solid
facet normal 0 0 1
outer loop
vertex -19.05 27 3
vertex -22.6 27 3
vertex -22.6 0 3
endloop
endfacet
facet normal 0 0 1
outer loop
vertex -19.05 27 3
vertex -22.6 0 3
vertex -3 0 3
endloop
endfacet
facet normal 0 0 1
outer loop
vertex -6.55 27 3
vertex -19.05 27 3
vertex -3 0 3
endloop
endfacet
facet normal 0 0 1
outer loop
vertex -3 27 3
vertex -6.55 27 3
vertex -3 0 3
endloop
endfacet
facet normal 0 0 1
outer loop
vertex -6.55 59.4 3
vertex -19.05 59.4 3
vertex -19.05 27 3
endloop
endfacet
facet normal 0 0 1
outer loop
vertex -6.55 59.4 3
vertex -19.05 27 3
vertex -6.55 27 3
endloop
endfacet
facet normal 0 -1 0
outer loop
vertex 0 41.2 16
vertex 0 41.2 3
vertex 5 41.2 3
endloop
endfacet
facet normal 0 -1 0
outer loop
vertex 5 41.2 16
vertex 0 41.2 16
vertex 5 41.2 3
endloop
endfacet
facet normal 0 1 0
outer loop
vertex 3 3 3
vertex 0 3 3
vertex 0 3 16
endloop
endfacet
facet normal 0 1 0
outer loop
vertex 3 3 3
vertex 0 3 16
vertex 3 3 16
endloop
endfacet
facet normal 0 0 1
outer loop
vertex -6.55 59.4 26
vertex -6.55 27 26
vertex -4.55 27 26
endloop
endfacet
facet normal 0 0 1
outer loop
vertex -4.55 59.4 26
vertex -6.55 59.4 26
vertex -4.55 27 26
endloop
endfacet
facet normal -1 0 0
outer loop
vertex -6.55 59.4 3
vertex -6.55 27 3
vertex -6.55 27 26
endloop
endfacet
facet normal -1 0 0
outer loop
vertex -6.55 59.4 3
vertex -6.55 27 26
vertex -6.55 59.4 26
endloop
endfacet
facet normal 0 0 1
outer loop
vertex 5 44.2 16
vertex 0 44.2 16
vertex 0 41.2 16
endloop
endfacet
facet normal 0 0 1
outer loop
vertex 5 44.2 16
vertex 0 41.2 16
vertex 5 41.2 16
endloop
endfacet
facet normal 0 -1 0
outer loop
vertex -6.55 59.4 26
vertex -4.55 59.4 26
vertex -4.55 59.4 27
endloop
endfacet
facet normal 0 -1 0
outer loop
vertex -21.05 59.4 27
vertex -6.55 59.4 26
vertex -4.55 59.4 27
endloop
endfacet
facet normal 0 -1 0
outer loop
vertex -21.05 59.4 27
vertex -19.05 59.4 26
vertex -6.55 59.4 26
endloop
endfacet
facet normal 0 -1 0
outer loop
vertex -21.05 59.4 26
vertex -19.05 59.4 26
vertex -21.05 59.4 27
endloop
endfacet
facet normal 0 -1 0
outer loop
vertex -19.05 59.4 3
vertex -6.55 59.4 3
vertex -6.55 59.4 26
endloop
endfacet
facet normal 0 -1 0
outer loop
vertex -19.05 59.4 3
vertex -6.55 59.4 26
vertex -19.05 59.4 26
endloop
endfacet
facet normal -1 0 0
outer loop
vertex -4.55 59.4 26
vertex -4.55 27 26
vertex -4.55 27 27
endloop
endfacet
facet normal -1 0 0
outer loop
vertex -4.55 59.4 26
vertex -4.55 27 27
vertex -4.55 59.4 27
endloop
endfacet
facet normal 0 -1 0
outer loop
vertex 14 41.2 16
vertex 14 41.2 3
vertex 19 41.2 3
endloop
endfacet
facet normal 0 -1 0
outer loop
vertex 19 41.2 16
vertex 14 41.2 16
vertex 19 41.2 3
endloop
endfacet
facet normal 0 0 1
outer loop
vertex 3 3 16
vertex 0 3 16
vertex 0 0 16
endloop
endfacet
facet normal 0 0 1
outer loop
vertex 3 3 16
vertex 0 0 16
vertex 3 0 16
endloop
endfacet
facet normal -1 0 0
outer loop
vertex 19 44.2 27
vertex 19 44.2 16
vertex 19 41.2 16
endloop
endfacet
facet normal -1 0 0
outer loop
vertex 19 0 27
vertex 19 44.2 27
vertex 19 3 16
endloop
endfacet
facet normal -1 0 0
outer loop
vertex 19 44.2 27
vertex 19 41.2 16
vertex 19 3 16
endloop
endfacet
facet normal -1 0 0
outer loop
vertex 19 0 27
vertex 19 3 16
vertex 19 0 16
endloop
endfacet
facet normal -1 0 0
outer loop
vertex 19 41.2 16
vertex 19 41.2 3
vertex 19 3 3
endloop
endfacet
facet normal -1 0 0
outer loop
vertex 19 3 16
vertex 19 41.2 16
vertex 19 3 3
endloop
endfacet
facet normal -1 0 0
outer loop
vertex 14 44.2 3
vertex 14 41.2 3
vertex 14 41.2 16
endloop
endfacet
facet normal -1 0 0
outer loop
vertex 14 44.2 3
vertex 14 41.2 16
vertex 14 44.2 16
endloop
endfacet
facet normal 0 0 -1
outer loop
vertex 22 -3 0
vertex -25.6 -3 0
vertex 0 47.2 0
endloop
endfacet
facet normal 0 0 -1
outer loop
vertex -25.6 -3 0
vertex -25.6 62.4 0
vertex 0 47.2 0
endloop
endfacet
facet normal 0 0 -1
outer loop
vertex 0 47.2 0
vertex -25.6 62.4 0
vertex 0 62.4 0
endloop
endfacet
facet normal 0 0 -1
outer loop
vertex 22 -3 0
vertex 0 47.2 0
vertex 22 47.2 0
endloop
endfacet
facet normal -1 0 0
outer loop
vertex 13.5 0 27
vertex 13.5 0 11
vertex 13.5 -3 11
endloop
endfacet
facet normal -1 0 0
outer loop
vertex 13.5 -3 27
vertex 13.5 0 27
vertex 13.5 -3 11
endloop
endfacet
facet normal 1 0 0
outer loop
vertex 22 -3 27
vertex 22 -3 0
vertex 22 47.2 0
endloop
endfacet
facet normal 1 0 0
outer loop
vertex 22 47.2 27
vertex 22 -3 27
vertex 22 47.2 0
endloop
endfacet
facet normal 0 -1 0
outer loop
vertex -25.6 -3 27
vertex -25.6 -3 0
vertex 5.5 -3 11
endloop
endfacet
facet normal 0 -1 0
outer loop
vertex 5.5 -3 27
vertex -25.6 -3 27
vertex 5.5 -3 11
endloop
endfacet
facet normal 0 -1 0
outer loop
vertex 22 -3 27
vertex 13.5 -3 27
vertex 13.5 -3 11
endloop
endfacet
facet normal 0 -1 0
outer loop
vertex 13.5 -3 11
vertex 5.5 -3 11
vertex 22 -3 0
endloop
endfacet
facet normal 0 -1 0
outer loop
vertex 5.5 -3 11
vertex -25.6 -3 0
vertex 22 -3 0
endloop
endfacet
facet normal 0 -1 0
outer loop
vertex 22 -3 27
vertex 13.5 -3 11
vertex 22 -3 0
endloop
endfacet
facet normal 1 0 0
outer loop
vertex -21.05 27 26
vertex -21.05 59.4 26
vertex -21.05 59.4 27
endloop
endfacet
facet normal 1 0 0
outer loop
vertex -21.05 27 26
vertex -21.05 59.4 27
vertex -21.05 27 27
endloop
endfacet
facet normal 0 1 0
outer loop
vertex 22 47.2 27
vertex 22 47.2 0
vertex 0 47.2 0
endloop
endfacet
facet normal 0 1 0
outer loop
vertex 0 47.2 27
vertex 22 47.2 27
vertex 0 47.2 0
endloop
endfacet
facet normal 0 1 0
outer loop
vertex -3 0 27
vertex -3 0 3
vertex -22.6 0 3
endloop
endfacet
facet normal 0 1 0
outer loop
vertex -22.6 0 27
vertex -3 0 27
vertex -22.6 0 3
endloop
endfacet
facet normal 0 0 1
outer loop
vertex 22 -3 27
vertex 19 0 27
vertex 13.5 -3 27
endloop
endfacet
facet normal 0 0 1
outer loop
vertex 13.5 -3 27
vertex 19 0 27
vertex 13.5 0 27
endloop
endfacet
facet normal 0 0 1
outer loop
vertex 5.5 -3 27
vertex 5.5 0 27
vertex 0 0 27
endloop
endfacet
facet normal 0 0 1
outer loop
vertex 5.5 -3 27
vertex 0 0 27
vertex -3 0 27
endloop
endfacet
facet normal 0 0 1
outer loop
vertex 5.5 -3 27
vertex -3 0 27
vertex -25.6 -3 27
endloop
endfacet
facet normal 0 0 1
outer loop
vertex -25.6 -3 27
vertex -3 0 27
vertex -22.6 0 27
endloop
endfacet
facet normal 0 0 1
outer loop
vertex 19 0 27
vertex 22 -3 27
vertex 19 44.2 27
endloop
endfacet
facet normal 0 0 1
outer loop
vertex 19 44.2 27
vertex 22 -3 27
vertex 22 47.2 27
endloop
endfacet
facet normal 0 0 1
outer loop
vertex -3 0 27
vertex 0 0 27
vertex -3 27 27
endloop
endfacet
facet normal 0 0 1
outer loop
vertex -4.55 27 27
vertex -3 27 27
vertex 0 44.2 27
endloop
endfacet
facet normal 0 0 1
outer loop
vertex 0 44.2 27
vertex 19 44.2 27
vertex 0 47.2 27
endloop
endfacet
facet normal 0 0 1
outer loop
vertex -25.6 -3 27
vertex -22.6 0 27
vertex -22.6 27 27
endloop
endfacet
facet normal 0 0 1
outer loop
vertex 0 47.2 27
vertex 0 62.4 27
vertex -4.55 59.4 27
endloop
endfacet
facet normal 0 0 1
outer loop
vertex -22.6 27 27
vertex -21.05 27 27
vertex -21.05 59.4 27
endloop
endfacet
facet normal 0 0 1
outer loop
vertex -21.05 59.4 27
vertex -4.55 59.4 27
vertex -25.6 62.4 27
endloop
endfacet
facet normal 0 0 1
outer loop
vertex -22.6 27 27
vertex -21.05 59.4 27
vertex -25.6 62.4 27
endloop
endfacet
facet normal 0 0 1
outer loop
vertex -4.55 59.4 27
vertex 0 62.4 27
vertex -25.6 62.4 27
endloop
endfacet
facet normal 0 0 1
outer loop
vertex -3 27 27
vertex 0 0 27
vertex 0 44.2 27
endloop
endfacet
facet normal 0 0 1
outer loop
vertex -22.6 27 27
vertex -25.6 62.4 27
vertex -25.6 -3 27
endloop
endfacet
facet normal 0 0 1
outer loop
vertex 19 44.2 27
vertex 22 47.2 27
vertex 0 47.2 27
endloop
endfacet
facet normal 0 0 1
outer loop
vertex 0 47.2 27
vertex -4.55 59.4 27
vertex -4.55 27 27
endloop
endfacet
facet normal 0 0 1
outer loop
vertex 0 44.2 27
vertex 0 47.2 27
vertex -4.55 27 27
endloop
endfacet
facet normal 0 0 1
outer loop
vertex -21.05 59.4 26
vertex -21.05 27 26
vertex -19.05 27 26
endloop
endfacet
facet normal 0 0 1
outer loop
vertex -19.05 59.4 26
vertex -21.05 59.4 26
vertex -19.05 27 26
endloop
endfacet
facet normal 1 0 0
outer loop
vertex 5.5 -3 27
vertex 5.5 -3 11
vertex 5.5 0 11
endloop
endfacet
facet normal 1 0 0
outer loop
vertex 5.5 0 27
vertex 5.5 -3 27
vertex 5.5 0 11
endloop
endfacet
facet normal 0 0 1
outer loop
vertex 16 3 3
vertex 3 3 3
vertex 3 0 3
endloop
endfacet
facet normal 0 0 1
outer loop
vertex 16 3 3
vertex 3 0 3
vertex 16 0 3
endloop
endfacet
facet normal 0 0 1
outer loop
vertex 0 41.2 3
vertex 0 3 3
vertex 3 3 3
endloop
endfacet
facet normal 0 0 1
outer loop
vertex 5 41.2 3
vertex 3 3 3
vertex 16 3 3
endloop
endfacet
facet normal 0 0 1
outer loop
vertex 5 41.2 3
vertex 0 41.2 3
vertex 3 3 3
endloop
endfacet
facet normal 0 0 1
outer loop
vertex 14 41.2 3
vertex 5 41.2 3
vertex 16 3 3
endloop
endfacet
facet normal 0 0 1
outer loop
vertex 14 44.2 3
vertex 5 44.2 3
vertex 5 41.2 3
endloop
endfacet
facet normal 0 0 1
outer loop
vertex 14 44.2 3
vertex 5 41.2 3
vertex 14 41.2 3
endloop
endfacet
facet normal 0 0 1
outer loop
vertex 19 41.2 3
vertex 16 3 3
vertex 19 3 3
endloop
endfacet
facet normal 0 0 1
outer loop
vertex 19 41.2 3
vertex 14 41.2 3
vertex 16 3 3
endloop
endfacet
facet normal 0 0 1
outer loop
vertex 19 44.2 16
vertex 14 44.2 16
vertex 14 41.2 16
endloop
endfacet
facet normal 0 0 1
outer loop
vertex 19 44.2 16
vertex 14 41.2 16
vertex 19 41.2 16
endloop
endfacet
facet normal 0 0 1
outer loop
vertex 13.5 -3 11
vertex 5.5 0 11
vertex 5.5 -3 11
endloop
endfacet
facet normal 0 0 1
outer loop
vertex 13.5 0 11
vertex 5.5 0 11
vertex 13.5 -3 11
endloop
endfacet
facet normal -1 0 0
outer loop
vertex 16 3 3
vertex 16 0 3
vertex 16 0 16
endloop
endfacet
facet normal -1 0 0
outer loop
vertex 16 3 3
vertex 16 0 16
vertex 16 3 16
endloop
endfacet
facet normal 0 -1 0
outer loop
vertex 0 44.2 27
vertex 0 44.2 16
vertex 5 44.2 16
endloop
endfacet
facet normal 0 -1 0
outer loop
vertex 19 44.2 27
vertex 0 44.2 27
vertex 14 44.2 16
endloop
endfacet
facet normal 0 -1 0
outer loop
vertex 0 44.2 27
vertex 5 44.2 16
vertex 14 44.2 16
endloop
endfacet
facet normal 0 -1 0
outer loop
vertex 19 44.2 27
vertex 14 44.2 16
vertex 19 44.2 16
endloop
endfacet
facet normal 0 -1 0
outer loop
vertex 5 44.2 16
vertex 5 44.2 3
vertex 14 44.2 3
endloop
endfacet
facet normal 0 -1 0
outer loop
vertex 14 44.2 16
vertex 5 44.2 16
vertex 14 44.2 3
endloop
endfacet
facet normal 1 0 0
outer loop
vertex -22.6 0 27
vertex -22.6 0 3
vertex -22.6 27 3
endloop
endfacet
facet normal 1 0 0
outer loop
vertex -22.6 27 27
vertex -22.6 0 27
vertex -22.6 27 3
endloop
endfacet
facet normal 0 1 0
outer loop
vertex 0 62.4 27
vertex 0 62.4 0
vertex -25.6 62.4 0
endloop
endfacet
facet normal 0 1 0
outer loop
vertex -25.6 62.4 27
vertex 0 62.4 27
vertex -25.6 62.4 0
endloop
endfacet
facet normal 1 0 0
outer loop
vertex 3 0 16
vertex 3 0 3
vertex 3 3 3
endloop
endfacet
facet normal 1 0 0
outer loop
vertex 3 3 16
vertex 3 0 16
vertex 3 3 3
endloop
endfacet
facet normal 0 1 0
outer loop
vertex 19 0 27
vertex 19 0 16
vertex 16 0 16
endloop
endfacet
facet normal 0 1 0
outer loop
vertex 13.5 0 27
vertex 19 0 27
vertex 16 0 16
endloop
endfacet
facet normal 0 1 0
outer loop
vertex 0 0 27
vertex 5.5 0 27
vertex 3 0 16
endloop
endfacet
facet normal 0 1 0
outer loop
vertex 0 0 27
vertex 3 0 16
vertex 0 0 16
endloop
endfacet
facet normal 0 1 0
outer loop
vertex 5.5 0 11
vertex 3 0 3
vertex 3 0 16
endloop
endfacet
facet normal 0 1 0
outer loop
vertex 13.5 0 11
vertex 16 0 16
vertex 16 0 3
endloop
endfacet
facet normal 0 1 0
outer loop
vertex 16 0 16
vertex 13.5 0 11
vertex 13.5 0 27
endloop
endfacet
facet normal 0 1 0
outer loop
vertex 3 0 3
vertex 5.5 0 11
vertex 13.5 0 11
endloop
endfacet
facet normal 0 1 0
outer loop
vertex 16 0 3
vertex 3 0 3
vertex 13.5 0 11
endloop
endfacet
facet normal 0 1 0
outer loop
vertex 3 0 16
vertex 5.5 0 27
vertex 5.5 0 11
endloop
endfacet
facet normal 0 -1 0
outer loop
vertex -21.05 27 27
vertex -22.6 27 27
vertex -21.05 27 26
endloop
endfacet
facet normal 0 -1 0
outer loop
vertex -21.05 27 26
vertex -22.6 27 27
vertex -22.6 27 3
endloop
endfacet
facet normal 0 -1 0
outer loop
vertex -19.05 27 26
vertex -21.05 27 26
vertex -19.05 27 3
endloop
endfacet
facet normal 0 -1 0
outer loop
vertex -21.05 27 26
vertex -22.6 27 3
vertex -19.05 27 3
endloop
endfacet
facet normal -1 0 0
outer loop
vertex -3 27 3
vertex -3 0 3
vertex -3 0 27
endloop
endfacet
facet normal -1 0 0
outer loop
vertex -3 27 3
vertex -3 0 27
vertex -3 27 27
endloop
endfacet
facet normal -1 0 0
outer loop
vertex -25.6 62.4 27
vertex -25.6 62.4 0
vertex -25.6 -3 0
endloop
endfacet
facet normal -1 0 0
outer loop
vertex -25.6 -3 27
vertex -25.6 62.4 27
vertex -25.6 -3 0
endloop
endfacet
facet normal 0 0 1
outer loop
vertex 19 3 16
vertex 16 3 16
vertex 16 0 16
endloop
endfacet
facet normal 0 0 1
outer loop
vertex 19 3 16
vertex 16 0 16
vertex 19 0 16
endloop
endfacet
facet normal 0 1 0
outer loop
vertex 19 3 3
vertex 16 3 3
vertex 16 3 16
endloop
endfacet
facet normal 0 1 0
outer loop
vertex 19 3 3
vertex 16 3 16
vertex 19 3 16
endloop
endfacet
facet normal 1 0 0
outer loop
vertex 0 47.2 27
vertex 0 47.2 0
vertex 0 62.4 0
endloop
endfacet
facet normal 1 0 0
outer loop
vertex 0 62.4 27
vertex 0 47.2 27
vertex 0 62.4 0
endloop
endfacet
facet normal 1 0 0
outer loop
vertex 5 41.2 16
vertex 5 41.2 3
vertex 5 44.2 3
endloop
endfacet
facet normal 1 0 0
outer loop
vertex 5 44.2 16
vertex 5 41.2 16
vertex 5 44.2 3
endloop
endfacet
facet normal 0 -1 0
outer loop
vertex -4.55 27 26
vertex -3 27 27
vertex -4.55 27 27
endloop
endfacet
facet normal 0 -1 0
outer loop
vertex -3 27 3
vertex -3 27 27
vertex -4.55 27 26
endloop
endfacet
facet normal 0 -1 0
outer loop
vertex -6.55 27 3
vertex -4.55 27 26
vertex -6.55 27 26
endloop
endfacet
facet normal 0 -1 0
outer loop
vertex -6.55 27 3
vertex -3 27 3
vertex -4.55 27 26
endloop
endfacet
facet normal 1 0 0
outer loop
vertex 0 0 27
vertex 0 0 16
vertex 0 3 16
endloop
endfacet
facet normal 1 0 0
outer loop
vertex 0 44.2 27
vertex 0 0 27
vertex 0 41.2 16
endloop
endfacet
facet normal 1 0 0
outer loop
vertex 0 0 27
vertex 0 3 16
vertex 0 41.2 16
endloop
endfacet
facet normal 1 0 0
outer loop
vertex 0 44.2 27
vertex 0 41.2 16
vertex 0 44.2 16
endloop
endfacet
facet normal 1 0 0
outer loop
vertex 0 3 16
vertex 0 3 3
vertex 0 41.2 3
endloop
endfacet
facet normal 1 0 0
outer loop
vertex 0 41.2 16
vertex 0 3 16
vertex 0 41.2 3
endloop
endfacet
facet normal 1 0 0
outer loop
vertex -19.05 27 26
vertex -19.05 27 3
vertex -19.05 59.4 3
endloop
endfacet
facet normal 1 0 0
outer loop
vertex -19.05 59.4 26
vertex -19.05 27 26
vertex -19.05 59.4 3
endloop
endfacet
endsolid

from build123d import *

# Parameters (mm, degrees)
BOSS_EXTRUDE1_DEPTH = 3
BOSS_EXTRUDE2_DEPTH = 27
SKETCH1_4_W         = 3
SKETCH1_4_H         = 3
SKETCH1_4_W_2       = 5
BOSS_EXTRUDE3_DEPTH = 16
SKETCH1_5_W         = 8
SKETCH1_5_H         = 3
BOSS_EXTRUDE4_DEPTH = 11
SKETCH1_6_W         = 2
SKETCH1_6_H         = 32.4
BOSS_EXTRUDE5_DEPTH = 26


with BuildPart() as part:
    # Sketch1 → Boss-Extrude1 (new body)
    with BuildSketch(Plane.XY):
        Polygon((-25.6, -3), (22, -3), (22, 47.2), (0, 47.2), (0, 62.4), (-25.6, 62.4), align=None)
    extrude(amount=BOSS_EXTRUDE1_DEPTH)

    # Sketch1<3> → Boss-Extrude2 (add)
    with BuildSketch(Plane.XY):
        Polygon((-25.6, -3), (5.5, -3), (5.5, 0), (0, 0), (0, 44.2), (19, 44.2), (19, 0), (13.5, 0), (13.5, -3), (22, -3), (22, 47.2), (0, 47.2), (0, 62.4), (-25.6, 62.4), align=None)
        Polygon((-3, 27), (-3, 0), (-22.6, 0), (-22.6, 27), (-21.05, 27), (-21.05, 59.4), (-4.55, 59.4), (-4.55, 27), align=None, mode=Mode.SUBTRACT)
    extrude(amount=BOSS_EXTRUDE2_DEPTH)

    # Sketch1<4> → Boss-Extrude3 (add)
    with BuildSketch(Plane.XY):
        with Locations((1.5, 1.5)):
            Rectangle(SKETCH1_4_W, SKETCH1_4_H)
        with Locations((2.5, 42.7)):
            Rectangle(SKETCH1_4_W_2, SKETCH1_4_H)
        with Locations((17.5, 1.5)):
            Rectangle(SKETCH1_4_W, SKETCH1_4_H)
        with Locations((16.5, 42.7)):
            Rectangle(SKETCH1_4_W_2, SKETCH1_4_H)
    extrude(amount=BOSS_EXTRUDE3_DEPTH)

    # Sketch1<5> → Boss-Extrude4 (add)
    with BuildSketch(Plane.XY):
        with Locations((9.5, -1.5)):
            Rectangle(SKETCH1_5_W, SKETCH1_5_H)
    extrude(amount=BOSS_EXTRUDE4_DEPTH)

    # Sketch1<6> → Boss-Extrude5 (add)
    with BuildSketch(Plane.XY):
        with Locations((-5.55, 43.2)):
            Rectangle(SKETCH1_6_W, SKETCH1_6_H)
        with Locations((-20.05, 43.2)):
            Rectangle(SKETCH1_6_W, SKETCH1_6_H)
    extrude(amount=BOSS_EXTRUDE5_DEPTH)


solid = part.part
